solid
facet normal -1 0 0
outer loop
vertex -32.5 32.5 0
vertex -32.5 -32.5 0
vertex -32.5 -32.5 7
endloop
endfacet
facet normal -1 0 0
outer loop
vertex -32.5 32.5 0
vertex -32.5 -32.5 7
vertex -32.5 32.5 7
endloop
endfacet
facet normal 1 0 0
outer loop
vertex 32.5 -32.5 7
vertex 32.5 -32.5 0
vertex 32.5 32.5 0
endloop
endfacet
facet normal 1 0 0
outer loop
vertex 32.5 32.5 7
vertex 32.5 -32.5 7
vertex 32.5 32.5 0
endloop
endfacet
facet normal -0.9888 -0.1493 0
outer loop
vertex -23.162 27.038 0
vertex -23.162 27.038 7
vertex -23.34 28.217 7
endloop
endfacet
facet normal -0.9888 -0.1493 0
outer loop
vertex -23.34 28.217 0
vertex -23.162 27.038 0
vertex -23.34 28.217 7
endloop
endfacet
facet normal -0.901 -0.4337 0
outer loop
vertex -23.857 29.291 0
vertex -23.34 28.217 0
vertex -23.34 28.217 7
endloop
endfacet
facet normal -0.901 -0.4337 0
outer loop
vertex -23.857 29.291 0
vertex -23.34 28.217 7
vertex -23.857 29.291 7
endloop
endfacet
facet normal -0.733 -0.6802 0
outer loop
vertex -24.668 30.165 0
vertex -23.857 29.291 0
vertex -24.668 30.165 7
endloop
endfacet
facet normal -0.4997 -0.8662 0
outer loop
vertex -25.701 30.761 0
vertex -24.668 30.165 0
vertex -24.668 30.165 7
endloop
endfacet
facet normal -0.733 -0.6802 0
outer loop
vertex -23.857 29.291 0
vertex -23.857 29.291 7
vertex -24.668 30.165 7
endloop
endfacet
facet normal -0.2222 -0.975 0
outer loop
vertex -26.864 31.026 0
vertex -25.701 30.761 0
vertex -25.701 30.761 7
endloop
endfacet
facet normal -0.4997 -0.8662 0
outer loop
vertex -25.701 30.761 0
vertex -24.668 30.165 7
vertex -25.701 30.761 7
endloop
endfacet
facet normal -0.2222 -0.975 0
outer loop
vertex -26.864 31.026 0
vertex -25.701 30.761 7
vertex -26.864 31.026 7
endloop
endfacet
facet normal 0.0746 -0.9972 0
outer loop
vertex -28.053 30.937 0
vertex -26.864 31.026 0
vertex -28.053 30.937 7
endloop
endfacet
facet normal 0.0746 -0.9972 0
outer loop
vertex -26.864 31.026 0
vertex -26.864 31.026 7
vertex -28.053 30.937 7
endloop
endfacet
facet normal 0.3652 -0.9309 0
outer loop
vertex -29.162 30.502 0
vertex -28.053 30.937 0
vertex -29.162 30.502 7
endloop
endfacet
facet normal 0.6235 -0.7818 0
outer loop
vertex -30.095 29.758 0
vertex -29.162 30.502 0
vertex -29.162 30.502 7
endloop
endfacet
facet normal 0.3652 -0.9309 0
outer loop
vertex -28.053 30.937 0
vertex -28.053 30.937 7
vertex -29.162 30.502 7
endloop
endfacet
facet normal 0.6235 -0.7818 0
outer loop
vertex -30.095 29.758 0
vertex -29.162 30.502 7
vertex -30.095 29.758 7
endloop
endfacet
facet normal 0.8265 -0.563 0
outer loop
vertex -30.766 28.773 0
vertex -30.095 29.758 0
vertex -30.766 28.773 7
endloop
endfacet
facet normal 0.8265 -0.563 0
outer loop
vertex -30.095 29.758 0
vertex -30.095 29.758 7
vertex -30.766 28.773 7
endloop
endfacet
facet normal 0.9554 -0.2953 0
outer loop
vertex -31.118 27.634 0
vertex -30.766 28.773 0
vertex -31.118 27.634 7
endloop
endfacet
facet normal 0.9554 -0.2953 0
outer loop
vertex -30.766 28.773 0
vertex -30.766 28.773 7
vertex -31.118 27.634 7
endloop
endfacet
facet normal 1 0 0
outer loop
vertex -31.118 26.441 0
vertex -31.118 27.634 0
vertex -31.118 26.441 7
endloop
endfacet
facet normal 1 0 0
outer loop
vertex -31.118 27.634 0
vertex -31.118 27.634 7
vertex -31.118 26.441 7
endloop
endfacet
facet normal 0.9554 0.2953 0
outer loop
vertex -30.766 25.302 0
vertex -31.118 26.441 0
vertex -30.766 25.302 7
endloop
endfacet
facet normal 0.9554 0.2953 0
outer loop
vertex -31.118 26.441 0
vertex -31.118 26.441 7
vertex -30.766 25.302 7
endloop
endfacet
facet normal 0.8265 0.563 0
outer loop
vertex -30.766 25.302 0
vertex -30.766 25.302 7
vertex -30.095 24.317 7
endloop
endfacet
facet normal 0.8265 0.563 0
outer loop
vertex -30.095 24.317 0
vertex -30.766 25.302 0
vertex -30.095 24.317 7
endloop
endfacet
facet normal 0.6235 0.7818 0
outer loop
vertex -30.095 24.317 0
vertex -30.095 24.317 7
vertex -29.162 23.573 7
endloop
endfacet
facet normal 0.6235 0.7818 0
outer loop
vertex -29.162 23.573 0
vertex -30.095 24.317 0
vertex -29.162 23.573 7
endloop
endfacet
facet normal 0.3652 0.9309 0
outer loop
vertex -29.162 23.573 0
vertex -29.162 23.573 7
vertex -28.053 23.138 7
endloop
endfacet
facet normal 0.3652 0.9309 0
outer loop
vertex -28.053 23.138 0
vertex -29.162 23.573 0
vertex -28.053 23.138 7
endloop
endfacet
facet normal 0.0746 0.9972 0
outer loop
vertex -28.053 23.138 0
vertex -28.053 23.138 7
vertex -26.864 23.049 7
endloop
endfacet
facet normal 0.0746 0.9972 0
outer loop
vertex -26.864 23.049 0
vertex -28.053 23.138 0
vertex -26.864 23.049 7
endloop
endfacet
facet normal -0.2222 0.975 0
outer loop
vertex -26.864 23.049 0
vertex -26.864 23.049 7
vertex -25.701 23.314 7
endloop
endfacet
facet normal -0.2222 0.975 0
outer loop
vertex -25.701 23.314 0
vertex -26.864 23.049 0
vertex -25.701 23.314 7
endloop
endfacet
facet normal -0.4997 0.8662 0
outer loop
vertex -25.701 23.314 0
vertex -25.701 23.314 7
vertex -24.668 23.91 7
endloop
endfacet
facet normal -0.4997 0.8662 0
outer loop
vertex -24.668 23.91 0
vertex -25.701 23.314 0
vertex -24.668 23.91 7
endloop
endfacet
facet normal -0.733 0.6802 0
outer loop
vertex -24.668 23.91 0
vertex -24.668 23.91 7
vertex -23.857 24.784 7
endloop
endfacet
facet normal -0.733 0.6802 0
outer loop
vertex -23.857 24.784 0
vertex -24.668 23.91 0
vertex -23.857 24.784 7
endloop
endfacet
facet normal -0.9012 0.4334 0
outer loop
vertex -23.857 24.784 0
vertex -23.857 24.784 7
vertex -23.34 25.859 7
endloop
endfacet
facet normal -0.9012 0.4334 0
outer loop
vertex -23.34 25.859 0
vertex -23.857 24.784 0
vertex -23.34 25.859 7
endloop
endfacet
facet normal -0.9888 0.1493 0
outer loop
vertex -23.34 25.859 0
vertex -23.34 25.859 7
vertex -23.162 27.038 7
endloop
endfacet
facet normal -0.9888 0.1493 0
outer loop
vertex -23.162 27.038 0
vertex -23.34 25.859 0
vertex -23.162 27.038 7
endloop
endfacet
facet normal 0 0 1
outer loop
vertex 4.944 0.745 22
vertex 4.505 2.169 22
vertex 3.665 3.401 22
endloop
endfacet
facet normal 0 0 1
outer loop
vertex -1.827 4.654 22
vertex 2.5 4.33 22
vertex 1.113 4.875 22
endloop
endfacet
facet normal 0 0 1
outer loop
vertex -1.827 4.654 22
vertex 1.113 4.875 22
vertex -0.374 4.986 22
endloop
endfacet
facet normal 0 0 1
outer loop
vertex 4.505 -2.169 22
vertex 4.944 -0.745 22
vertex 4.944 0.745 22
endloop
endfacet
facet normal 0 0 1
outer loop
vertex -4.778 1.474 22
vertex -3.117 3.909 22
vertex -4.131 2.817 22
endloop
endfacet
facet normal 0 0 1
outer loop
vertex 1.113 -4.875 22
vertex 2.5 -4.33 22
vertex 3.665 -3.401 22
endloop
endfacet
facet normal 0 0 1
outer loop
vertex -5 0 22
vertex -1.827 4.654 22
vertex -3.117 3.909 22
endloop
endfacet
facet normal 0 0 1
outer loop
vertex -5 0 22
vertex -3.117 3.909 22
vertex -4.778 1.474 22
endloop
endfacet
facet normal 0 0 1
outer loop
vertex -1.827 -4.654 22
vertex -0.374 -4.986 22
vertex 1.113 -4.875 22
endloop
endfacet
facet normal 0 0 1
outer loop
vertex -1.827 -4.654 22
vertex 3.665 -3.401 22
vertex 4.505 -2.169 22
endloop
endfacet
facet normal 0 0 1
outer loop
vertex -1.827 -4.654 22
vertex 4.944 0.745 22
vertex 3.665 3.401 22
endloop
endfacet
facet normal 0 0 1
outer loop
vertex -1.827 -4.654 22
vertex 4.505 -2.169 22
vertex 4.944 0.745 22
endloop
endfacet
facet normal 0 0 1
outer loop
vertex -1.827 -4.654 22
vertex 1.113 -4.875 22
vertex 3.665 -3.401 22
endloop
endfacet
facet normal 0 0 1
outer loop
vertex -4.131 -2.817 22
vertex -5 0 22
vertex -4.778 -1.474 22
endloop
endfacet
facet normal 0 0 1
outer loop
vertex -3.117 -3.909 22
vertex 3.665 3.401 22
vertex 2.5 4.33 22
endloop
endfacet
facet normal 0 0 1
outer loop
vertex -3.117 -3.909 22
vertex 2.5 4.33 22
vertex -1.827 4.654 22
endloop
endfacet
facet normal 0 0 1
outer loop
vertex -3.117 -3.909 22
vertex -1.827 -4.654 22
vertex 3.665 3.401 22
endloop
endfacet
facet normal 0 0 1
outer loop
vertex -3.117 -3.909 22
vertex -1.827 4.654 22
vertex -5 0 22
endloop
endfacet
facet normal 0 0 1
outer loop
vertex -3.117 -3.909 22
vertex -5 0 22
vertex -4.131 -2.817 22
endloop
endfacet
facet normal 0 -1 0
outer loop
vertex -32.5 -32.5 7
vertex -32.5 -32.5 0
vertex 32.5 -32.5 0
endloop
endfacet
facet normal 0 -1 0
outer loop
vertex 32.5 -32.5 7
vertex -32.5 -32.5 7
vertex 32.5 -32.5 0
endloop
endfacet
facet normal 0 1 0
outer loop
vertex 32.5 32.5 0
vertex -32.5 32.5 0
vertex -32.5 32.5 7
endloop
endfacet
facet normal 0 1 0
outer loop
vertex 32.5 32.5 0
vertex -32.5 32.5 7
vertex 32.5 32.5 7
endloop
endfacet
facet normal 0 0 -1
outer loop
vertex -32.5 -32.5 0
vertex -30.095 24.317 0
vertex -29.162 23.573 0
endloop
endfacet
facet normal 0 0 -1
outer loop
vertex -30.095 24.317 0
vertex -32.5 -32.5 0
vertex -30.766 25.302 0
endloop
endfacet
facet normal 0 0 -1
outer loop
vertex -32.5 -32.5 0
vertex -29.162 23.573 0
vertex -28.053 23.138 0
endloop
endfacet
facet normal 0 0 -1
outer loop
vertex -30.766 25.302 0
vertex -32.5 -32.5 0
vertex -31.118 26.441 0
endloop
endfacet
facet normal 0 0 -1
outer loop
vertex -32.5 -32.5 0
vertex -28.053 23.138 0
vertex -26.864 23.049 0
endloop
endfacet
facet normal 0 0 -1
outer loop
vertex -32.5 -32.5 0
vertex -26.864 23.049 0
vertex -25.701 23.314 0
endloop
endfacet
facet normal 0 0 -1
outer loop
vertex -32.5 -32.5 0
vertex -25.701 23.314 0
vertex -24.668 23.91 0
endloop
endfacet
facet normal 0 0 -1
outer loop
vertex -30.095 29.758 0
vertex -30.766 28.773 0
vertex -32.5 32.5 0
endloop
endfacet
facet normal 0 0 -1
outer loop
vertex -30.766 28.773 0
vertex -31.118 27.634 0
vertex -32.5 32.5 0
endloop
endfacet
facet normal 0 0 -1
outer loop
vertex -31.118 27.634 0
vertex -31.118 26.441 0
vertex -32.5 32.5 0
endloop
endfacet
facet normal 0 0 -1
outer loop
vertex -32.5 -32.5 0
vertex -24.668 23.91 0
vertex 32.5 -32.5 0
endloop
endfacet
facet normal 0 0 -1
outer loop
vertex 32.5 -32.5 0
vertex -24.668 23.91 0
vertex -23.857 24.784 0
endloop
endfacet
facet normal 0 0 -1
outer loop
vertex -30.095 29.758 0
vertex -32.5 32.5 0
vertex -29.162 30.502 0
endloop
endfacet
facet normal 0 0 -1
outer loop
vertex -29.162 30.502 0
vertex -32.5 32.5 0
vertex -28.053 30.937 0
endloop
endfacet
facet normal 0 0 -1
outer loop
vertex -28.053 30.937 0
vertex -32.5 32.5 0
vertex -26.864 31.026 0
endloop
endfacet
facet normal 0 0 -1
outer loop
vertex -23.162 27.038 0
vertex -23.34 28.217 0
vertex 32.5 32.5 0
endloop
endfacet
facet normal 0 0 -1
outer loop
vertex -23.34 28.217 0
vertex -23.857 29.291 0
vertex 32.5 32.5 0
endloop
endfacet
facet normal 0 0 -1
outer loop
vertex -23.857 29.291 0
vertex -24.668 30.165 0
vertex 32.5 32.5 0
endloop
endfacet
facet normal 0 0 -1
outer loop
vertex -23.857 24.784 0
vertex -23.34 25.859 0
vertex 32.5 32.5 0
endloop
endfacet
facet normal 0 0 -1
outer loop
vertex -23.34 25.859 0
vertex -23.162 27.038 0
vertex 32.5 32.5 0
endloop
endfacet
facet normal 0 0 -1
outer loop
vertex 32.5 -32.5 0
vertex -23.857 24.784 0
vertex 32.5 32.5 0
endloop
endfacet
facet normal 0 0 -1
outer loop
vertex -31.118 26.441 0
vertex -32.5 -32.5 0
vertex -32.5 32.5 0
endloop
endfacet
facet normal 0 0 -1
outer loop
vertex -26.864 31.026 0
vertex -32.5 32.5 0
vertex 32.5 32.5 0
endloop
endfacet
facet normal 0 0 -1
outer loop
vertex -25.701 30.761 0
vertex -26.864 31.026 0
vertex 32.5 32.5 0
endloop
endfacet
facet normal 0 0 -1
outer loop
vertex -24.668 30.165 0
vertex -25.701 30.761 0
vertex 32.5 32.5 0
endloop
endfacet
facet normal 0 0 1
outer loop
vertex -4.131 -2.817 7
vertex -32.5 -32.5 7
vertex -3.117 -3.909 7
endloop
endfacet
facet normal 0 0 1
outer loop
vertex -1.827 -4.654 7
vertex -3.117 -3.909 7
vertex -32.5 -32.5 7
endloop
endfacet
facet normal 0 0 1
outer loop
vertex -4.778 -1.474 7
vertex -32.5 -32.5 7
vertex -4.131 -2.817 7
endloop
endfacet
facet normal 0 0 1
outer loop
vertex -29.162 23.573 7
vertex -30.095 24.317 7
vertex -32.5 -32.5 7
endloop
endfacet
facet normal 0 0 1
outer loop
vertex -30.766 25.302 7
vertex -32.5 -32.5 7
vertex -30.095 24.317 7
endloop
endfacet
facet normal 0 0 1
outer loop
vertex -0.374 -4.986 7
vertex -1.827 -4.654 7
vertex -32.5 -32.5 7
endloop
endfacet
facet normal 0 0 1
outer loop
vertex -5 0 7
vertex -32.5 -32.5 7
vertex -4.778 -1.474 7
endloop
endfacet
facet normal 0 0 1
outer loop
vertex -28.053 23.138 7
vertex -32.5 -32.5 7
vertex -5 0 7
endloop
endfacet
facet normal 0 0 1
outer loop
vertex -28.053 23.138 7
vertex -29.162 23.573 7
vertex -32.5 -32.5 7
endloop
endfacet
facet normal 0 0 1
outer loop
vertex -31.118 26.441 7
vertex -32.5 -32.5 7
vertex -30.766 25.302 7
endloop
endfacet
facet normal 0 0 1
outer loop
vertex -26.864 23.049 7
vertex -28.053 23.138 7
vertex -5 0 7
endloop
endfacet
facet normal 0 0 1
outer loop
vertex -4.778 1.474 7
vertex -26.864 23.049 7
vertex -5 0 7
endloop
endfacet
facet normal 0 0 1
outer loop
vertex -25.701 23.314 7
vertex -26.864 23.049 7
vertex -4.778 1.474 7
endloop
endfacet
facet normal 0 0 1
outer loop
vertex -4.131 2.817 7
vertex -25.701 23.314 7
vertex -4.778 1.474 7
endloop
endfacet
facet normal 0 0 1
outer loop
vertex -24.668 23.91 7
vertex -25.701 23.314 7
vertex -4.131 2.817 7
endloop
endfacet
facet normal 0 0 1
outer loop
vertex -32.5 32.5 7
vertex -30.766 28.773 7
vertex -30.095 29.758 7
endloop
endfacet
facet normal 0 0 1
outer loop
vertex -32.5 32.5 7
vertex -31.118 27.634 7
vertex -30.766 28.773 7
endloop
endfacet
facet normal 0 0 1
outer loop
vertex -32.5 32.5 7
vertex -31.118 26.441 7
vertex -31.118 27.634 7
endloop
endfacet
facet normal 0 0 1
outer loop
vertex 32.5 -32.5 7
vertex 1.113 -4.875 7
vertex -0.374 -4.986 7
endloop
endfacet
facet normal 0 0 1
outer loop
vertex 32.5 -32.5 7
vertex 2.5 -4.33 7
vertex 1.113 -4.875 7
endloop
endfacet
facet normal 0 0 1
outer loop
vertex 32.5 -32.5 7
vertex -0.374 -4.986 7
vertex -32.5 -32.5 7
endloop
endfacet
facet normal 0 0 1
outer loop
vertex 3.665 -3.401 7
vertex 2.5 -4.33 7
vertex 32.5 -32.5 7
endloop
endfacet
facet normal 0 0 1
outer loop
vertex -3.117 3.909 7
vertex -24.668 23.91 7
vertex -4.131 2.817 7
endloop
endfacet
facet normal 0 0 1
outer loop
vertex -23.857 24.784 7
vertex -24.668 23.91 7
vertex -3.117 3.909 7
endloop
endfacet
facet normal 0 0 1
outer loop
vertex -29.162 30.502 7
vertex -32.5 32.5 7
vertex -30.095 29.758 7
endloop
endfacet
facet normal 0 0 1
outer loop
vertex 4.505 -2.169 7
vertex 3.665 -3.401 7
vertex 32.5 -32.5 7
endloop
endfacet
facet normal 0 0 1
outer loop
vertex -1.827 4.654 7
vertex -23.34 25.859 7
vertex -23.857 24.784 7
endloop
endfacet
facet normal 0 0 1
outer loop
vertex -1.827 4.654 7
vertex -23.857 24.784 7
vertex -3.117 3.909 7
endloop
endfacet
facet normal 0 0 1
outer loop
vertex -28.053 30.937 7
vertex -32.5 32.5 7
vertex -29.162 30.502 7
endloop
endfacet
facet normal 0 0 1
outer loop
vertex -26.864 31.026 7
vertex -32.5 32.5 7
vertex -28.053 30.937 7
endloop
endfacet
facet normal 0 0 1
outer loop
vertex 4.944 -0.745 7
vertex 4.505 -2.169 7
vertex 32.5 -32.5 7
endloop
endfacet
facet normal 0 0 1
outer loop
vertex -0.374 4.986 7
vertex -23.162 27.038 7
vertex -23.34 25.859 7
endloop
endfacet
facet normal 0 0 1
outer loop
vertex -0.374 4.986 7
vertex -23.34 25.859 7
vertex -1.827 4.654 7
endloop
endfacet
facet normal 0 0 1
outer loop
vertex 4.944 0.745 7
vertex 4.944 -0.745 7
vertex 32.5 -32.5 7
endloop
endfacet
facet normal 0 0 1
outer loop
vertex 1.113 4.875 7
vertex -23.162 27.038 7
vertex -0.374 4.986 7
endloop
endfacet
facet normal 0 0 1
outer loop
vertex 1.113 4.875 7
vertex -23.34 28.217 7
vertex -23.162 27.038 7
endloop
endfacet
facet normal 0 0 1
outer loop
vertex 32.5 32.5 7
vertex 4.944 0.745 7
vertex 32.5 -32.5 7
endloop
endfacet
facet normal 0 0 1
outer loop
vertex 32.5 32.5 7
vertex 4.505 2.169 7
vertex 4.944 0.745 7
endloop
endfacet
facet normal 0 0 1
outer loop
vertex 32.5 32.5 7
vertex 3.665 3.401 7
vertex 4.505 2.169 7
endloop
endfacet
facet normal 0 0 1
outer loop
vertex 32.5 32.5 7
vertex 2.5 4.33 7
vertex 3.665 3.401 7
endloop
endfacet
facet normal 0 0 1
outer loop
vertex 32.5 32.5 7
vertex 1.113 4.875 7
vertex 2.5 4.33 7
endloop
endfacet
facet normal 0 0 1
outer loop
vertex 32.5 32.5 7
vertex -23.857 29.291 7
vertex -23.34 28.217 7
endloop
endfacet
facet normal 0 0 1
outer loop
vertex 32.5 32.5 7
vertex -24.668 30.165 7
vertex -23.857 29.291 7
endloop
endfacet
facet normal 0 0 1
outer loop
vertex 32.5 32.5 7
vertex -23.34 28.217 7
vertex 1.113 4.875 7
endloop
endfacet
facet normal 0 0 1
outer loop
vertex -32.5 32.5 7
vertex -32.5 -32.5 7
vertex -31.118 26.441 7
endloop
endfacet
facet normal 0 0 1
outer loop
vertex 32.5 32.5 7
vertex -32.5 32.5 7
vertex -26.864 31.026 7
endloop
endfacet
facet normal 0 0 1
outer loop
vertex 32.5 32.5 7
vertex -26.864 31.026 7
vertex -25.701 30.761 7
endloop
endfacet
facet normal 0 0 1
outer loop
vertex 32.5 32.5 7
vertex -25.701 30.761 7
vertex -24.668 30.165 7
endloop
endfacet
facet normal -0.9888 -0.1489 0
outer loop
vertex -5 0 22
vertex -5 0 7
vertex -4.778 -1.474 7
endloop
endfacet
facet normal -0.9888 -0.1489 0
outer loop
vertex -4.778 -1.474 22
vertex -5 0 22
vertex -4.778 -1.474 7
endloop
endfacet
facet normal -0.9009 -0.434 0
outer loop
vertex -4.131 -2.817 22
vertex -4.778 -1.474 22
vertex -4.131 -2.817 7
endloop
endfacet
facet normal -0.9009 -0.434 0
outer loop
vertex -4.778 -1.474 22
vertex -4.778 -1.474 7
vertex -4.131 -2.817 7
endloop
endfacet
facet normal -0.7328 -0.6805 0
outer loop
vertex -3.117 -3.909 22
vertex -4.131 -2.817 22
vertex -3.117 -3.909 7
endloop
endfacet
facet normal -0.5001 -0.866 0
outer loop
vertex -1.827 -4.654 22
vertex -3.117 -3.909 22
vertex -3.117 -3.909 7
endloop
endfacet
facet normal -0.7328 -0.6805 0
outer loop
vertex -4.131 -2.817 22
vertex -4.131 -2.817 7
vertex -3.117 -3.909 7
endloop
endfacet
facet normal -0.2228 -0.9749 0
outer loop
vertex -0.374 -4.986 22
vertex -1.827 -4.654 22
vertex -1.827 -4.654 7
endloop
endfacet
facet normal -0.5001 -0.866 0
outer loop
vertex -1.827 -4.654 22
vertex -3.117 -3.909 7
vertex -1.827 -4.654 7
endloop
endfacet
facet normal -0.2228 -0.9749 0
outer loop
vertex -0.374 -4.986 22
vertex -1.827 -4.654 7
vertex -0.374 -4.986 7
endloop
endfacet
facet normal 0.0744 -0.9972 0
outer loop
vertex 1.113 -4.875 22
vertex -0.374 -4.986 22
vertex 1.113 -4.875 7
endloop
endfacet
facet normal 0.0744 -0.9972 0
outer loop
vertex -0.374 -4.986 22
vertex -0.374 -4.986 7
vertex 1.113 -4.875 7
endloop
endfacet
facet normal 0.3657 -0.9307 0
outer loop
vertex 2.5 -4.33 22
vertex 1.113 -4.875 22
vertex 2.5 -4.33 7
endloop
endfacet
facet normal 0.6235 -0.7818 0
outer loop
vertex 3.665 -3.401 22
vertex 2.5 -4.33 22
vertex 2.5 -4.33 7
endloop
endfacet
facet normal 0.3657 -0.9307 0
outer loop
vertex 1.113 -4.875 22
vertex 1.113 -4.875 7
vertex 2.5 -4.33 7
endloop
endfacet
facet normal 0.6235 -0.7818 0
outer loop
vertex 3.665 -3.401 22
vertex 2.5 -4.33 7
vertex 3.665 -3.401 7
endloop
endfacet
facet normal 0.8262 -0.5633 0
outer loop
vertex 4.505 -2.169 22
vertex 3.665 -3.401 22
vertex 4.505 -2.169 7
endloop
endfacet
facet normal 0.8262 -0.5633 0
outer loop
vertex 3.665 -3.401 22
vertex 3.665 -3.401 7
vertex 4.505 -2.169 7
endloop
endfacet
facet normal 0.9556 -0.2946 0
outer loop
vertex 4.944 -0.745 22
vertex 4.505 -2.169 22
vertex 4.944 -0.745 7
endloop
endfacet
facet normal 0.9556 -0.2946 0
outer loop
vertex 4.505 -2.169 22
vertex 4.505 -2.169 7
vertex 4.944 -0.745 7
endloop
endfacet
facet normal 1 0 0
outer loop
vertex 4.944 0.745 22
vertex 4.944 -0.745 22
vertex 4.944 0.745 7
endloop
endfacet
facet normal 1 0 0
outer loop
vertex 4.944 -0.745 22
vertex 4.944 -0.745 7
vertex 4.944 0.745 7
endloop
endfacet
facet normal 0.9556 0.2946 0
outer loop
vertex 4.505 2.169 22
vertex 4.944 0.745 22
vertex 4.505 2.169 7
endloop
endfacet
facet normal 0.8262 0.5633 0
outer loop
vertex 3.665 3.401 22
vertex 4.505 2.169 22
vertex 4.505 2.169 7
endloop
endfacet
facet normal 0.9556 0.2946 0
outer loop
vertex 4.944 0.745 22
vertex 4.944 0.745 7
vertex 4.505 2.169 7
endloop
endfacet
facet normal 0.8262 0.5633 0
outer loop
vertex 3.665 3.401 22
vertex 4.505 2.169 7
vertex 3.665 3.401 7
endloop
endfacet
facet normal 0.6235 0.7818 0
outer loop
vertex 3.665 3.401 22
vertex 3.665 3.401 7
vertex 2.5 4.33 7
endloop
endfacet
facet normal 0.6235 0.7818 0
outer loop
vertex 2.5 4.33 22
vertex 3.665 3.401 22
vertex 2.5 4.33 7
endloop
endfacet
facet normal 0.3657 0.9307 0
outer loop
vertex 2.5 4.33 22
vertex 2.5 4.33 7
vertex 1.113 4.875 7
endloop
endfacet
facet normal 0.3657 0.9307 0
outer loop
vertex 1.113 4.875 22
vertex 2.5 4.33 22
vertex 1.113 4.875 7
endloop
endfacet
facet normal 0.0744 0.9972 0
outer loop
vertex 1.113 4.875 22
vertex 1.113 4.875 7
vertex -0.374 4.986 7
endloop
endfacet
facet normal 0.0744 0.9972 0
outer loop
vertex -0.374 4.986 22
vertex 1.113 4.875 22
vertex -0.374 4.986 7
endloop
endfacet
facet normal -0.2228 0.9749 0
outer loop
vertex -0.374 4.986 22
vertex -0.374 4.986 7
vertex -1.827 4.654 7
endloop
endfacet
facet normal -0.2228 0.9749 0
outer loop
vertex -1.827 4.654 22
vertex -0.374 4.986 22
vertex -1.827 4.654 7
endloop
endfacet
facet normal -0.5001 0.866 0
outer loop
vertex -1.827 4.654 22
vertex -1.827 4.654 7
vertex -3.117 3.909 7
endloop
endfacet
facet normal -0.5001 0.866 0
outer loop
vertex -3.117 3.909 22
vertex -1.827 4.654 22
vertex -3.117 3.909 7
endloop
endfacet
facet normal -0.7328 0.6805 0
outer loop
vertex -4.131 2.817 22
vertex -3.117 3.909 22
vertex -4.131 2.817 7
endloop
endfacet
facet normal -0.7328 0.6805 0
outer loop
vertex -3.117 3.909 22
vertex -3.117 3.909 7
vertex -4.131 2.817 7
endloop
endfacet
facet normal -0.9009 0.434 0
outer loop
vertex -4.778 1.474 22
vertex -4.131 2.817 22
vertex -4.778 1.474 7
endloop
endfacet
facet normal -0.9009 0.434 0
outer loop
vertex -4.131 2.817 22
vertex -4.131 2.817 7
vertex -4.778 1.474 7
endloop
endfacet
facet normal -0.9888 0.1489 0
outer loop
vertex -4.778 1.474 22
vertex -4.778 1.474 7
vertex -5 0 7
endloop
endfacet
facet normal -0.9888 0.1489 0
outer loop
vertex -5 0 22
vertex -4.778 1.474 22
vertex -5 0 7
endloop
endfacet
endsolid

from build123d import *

# Parameters (mm, degrees)
SKETCH2_W           = 65
SKETCH2_H           = 65
BOSS_EXTRUDE1_DEPTH = 7
SKETCH3_R           = 5
BOSS_EXTRUDE2_DEPTH = 15
SKETCH4_R           = 4
CUT_EXTRUDE1_DEPTH  = 49.347699015


with BuildPart() as part:
    # Sketch2 → Boss-Extrude1 (new body)
    with BuildSketch(Plane.XY):
        Rectangle(SKETCH2_W, SKETCH2_H)
    extrude(amount=BOSS_EXTRUDE1_DEPTH)

    # Sketch3 → Boss-Extrude2 (add)
    with BuildSketch(Plane.XY.offset(7)):
        with Locations(Location((0, 0, 0), (0, 0, 180))):
            Circle(SKETCH3_R)
    extrude(amount=BOSS_EXTRUDE2_DEPTH)

    # Sketch4 → Cut-Extrude1 (cut, through all)
    with BuildSketch(Plane.XY.offset(7)):
        with Locations((-27.162431983, 27.037591963)):
            Circle(SKETCH4_R)
    extrude(amount=-CUT_EXTRUDE1_DEPTH, mode=Mode.SUBTRACT)


solid = part.part
